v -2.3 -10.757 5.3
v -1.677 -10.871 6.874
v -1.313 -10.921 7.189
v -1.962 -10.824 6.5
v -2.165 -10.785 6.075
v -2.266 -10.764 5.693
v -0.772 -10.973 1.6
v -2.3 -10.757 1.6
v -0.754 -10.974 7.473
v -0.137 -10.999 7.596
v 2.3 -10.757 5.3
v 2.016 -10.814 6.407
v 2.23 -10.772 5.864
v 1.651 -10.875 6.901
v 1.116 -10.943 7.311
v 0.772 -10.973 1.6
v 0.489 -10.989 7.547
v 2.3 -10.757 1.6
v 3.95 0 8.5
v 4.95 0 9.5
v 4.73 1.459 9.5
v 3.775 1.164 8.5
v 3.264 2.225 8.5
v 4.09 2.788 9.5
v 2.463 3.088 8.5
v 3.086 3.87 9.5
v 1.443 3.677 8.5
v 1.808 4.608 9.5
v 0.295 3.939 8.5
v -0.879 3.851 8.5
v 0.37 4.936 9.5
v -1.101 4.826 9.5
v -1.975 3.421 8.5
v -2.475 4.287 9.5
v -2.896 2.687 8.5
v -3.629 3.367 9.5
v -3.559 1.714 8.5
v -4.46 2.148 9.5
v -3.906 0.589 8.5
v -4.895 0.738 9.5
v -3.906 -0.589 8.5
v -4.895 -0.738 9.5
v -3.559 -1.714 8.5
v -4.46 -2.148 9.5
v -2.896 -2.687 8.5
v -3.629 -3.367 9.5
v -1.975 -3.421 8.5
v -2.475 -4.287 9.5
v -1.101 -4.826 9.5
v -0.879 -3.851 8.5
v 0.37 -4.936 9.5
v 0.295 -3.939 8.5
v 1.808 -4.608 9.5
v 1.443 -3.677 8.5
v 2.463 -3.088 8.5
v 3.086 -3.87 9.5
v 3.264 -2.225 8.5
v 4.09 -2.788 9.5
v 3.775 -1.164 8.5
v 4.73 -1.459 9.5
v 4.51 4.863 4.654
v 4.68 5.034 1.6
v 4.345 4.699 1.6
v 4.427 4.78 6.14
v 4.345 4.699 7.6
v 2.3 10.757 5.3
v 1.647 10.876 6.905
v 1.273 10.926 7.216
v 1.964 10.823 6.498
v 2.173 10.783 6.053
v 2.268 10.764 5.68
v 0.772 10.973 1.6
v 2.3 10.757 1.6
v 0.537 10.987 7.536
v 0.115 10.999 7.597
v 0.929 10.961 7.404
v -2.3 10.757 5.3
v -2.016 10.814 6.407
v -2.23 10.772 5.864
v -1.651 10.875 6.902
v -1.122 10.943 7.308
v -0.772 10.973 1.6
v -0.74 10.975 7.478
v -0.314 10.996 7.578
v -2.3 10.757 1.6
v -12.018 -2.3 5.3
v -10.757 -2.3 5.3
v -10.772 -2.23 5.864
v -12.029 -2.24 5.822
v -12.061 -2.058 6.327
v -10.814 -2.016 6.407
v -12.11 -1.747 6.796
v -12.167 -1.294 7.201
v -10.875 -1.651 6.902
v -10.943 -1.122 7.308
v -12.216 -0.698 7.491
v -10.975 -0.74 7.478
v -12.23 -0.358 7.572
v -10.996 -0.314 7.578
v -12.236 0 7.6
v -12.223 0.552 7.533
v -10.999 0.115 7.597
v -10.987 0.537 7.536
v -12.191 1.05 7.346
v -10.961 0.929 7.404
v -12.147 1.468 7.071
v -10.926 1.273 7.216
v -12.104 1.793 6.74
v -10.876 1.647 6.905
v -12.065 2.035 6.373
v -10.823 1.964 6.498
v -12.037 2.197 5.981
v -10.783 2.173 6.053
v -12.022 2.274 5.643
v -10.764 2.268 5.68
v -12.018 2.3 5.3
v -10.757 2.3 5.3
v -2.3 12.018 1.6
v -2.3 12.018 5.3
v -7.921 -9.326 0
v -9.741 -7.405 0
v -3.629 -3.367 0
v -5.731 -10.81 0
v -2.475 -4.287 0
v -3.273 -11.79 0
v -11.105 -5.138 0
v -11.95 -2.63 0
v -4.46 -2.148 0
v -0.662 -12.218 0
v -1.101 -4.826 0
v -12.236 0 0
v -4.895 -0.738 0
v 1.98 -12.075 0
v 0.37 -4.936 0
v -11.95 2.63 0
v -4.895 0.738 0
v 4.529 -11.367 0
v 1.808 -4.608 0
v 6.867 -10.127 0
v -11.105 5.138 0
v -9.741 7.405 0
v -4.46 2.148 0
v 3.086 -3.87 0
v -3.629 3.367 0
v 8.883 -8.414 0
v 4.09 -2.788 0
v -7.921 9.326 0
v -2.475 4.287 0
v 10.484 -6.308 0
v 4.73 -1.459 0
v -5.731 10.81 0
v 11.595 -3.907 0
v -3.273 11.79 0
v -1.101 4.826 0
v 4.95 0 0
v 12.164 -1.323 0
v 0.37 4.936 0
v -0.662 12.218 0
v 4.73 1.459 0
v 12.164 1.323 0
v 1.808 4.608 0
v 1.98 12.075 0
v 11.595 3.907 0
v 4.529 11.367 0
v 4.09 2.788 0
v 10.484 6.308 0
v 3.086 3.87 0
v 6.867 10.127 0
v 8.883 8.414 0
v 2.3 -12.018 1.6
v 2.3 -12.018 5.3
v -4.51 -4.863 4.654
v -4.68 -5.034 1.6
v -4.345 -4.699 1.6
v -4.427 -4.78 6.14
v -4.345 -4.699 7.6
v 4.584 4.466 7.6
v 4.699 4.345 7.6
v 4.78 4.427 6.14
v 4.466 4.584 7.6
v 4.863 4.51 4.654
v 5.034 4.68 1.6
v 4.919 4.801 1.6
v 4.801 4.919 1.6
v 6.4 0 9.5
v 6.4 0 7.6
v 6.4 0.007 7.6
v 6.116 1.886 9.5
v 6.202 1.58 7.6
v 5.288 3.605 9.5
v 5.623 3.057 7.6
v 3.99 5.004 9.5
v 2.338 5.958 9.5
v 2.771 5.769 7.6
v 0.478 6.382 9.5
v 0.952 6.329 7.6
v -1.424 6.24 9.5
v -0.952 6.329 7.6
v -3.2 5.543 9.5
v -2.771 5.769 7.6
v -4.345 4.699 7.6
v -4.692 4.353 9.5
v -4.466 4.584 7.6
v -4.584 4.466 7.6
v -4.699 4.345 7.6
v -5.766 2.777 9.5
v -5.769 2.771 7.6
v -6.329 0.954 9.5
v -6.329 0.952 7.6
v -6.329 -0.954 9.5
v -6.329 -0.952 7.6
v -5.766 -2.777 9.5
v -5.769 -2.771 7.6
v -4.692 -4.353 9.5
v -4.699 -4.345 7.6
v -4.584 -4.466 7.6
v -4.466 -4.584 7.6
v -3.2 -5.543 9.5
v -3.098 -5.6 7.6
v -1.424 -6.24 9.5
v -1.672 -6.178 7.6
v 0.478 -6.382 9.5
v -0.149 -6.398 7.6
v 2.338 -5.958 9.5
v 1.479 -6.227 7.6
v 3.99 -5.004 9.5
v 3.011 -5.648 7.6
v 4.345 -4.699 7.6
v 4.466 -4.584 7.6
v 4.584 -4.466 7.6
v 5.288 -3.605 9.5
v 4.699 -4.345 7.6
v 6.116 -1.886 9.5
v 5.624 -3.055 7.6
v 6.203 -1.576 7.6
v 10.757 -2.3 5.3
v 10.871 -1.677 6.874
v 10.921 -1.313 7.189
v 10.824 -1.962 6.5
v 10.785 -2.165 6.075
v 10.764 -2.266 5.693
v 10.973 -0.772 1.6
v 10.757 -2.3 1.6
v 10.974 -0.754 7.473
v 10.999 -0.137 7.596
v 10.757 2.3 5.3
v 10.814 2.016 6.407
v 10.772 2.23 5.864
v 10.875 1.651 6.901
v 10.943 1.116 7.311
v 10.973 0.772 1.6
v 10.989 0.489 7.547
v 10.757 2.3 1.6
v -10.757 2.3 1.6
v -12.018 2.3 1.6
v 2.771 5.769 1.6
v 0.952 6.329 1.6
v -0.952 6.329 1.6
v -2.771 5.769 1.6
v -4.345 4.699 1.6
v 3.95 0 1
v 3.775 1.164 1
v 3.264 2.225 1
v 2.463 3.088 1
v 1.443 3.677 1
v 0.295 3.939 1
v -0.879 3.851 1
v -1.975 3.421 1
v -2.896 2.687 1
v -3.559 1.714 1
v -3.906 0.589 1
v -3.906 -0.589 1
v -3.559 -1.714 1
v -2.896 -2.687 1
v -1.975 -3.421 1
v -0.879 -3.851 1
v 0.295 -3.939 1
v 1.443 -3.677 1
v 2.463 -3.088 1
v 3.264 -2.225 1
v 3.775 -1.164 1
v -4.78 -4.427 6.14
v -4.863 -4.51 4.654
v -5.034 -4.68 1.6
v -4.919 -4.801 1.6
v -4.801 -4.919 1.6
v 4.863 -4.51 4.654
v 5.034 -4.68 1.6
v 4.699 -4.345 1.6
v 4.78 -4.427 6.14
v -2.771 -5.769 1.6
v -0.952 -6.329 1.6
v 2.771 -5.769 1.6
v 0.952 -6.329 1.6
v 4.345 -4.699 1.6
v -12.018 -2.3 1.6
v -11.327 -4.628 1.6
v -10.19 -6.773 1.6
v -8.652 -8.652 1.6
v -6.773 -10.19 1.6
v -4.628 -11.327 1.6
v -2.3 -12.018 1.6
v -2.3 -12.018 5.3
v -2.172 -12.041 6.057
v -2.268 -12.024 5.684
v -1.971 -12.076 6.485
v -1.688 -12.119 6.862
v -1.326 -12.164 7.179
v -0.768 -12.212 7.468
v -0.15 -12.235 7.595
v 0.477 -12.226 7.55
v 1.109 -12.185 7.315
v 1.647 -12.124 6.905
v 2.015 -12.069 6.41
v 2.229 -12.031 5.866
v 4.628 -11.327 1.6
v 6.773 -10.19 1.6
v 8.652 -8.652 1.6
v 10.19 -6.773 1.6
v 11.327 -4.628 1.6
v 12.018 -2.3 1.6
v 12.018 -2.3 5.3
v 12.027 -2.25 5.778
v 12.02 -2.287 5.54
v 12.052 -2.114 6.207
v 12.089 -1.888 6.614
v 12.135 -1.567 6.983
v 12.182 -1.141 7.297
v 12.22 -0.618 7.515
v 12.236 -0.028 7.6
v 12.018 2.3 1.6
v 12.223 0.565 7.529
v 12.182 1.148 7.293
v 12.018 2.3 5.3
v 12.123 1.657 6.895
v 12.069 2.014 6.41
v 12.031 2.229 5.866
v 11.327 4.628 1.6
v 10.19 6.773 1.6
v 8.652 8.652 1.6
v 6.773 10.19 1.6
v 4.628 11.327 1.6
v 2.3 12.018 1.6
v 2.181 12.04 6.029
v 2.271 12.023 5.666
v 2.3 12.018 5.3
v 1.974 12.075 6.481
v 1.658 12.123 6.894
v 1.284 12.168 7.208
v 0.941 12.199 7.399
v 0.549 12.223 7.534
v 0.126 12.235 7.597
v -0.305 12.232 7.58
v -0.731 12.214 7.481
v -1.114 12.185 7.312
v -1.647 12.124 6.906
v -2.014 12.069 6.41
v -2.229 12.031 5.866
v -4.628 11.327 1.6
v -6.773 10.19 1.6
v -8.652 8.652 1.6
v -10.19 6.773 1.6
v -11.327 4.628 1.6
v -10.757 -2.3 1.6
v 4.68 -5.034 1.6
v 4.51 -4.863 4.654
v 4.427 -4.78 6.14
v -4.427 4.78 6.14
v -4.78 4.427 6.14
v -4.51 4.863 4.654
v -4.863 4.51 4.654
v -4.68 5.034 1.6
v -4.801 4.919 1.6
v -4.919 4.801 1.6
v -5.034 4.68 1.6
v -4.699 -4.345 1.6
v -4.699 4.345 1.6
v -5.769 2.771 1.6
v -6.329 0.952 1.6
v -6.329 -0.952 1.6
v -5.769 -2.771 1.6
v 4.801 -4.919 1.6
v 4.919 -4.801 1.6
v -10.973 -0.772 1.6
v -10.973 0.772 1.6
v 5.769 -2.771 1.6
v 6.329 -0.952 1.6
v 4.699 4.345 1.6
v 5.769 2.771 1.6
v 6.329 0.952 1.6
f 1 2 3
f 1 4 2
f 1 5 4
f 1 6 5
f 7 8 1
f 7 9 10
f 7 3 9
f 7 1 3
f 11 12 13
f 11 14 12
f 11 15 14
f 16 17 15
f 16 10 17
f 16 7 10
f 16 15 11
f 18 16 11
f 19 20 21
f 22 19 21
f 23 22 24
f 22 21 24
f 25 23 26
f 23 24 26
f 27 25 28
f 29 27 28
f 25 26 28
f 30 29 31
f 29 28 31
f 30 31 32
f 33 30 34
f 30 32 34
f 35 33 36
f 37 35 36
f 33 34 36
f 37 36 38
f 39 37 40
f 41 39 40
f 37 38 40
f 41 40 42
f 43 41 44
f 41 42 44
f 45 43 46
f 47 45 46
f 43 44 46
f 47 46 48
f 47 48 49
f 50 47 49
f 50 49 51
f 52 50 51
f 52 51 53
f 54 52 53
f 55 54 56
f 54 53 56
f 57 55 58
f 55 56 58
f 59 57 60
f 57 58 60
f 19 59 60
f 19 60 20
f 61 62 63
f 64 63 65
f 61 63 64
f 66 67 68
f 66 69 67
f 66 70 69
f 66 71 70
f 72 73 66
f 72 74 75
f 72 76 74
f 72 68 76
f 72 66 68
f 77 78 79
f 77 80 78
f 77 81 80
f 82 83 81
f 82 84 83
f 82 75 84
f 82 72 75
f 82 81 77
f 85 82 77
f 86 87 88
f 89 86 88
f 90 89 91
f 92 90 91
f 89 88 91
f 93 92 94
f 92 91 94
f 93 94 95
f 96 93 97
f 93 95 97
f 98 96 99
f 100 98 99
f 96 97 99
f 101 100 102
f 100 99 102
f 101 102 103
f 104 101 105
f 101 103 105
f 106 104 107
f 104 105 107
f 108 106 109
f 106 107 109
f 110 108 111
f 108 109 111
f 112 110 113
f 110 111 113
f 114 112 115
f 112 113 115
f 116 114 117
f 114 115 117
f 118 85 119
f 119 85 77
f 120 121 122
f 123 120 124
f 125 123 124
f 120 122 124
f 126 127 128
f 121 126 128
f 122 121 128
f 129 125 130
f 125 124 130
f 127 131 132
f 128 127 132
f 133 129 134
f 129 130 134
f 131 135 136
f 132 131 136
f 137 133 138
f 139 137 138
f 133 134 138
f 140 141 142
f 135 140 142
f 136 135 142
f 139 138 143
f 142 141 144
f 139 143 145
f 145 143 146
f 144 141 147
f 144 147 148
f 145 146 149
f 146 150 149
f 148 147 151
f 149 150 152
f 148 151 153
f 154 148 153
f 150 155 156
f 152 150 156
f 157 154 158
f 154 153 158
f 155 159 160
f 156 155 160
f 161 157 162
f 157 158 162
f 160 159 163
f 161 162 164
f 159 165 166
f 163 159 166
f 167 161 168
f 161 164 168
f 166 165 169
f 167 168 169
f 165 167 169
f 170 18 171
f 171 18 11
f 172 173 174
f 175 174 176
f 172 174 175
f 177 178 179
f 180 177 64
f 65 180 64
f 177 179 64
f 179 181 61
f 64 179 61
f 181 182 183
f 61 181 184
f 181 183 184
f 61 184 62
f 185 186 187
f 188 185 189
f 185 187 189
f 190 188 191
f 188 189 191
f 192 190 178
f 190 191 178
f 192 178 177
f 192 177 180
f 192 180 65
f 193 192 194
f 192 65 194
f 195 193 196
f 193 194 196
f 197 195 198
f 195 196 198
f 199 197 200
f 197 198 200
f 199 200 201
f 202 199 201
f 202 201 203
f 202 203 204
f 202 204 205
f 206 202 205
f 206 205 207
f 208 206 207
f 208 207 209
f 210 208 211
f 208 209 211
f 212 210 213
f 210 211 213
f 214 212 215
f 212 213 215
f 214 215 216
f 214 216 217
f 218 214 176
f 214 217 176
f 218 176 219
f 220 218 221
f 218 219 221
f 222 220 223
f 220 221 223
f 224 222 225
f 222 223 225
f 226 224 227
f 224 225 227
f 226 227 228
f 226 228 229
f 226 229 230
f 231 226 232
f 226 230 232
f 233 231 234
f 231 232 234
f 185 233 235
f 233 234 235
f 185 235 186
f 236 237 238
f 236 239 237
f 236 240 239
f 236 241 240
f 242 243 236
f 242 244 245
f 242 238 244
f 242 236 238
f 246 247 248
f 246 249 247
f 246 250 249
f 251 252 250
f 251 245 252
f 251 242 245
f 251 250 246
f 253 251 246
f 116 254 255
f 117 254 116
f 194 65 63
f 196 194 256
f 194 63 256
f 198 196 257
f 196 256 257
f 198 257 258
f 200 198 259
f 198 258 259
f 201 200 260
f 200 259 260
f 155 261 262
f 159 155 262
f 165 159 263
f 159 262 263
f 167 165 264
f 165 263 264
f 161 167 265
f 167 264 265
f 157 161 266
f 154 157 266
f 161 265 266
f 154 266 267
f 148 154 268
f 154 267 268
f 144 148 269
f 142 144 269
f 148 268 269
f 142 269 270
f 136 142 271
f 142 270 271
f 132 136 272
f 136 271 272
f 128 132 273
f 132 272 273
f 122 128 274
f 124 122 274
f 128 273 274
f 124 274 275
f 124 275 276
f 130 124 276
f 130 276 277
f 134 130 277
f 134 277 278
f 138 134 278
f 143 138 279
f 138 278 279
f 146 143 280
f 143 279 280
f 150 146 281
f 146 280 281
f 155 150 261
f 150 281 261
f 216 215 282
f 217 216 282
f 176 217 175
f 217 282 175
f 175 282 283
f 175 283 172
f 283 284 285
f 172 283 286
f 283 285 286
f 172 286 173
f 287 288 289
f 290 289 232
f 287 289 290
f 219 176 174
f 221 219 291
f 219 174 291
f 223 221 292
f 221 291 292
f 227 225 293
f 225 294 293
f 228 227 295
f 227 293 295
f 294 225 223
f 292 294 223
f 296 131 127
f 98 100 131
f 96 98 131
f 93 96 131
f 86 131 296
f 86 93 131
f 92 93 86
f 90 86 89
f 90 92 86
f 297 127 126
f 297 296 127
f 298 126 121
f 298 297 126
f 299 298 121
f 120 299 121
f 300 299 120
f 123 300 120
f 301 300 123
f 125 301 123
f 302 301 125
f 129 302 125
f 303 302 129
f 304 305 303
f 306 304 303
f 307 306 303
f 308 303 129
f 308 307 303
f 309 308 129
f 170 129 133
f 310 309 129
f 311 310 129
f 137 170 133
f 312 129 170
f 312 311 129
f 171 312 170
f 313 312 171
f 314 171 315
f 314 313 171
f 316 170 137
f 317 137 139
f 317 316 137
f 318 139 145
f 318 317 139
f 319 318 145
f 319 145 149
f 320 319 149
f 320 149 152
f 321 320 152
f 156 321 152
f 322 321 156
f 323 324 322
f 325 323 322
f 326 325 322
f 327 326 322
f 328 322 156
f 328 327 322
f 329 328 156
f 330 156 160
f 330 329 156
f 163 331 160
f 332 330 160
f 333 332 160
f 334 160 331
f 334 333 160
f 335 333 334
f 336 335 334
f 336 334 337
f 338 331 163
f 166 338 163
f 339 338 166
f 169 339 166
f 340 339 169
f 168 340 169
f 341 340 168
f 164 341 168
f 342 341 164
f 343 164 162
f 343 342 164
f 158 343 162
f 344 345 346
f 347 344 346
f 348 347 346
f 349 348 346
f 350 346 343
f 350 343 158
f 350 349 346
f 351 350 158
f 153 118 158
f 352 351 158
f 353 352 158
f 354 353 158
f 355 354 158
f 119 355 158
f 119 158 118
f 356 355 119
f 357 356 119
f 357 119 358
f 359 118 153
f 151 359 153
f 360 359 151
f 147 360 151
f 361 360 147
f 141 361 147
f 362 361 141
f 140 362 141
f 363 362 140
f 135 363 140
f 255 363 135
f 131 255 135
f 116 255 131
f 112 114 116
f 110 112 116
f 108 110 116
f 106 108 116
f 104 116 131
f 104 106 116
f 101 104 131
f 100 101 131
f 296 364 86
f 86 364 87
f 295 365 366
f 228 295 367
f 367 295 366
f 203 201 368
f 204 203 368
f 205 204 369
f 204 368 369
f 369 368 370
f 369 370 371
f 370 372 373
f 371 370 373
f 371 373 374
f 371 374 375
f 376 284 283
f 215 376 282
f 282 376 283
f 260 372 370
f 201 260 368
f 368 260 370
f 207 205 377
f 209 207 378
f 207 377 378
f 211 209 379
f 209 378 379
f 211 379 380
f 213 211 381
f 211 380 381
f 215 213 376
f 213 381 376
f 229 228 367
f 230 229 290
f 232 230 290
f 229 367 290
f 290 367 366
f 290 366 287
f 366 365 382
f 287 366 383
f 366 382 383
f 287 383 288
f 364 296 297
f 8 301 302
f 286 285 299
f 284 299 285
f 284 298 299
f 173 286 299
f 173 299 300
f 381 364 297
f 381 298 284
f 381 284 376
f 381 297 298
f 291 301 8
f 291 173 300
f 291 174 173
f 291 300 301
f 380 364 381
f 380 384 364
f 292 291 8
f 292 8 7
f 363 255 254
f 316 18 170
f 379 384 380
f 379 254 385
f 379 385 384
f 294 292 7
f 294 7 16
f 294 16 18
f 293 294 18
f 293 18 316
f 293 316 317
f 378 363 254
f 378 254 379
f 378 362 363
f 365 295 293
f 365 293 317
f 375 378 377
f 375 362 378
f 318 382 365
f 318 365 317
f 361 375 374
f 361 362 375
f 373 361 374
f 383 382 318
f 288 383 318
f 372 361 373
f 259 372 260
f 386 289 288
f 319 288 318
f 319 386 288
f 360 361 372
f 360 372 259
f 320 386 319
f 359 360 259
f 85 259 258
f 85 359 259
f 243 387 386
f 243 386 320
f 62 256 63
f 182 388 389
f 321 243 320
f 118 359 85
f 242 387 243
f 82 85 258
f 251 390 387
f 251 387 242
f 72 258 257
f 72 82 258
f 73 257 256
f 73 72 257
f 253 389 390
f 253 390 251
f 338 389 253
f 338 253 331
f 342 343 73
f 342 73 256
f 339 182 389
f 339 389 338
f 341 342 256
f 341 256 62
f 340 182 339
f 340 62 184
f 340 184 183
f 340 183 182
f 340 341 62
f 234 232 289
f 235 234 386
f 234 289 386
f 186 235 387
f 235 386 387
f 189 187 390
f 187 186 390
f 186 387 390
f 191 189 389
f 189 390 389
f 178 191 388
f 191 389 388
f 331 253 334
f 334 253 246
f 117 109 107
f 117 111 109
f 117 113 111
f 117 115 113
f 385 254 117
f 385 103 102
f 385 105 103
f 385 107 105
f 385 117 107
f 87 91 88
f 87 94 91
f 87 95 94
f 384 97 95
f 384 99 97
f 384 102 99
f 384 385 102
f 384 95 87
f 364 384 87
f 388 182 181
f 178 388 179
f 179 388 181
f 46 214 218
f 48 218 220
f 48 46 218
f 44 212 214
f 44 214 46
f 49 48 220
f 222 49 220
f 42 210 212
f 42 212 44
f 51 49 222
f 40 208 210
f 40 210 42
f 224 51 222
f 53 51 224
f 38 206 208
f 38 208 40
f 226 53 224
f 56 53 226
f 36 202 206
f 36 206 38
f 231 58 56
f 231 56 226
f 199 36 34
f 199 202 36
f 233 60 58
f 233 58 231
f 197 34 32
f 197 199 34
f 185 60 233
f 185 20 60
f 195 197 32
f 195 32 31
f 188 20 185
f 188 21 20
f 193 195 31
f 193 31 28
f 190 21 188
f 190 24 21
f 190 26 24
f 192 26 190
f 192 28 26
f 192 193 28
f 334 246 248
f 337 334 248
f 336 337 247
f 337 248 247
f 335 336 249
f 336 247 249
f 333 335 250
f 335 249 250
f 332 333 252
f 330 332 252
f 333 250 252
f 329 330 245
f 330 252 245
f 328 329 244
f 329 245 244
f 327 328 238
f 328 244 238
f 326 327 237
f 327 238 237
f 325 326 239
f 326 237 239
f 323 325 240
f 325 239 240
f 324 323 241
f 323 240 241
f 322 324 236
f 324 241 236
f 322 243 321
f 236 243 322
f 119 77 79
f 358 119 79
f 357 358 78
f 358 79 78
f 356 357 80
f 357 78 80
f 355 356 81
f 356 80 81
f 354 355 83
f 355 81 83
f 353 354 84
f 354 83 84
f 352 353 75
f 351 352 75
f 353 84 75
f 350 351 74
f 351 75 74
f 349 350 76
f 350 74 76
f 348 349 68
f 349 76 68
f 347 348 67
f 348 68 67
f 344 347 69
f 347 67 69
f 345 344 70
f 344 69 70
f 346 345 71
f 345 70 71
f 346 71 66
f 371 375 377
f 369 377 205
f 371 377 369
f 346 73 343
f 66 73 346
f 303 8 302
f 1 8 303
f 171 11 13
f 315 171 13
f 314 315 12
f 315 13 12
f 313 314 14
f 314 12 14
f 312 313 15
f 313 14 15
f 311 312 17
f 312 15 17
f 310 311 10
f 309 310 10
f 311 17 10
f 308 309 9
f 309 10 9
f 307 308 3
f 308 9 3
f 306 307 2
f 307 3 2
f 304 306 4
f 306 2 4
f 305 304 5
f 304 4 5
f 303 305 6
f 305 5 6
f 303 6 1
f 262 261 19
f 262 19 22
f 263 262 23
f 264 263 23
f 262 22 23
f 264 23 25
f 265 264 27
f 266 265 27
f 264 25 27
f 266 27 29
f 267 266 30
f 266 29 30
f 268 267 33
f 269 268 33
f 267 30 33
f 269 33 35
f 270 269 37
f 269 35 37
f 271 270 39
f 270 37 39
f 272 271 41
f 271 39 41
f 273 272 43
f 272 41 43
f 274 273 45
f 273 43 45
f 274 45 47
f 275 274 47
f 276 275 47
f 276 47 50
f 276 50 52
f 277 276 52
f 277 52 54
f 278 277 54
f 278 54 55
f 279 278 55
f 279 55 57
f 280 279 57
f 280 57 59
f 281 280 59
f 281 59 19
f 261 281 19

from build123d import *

# Parameters (mm, degrees)
SKETCH_R           = 12.45
PAD_DEPTH          = 1.6
SKETCH001_R        = 6.4
PAD001_DEPTH       = 7.9
PAD002_DEPTH       = 14
POLARPATTERN_COUNT = 4
POCKET_DEPTH       = 10
SKETCH004_W        = 4
SKETCH004_H        = 10
SKETCH005_R        = 3.95
POCKET001_DEPTH    = 9.501
CHAMFER_SIZE       = 1


with BuildPart() as part:
    # Sketch → Pad (new body)
    with BuildSketch(Plane.XY):
        Circle(SKETCH_R)
    extrude(amount=PAD_DEPTH)

    # Sketch001 (on Face3 of Pad) → Pad001 (join)
    with BuildSketch(Plane.XY.offset(1.6)):
        Circle(SKETCH001_R)
    extrude(amount=PAD001_DEPTH)

    # Sketch002 → Pad002 (join)
    with BuildSketch(Plane.XZ):
        with BuildLine():
            Line((-2.3, 0), (-2.3, 5.3))
            ThreePointArc((2.3, 5.3), (0, 7.6), (-2.3, 5.3))
            Line((2.3, 0), (2.3, 5.3))
            Line((-2.3, 0), (2.3, 0))
        make_face()
    pad002 = extrude(amount=PAD002_DEPTH)

    # PolarPattern: Pad002 ×4 about axis
    polarpattern_axis = Axis((0, 0, 0), (0, 0, 1))
    for i in range(1, POLARPATTERN_COUNT):
        add(pad002.rotate(polarpattern_axis, i * 360 / POLARPATTERN_COUNT))

    # Sketch006 → Revolution (revolve)
    with BuildSketch(Plane.XZ):
        Polygon((0, 0), (0, 7.6), (6.4, 7.6), (7, 0), align=None)
    revolve(axis=Axis((0, 0, 0), (0, 0, 1)))

    # Sketch007 (on Face28 of Revolution) → Pocket (cut)
    with BuildSketch(Plane.XY.offset(1.6)):
        with BuildLine():
            ThreePointArc((-7.952942, 7.599389), (-11, 0), (-7.952942, -7.599389))
            Line((-7.952942, -7.599389), (-4.698806, -4.345253))
            ThreePointArc((-4.698806, 4.345253), (-6.4, 0), (-4.698806, -4.345253))
            Line((-7.952942, 7.599389), (-4.698806, 4.345253))
        make_face()
        with BuildLine():
            ThreePointArc((-7.599389, -7.952942), (0, -11), (7.599389, -7.952942))
            Line((7.599389, -7.952942), (4.345253, -4.698806))
            ThreePointArc((-4.345253, -4.698806), (0, -6.4), (4.345253, -4.698806))
            Line((-7.599389, -7.952942), (-4.345253, -4.698806))
        make_face()
        with BuildLine():
            ThreePointArc((7.952942, -7.599389), (11, 0), (7.952942, 7.599389))
            Line((7.952942, 7.599389), (4.698806, 4.345253))
            ThreePointArc((4.698806, -4.345253), (6.4, 0), (4.698806, 4.345253))
            Line((7.952942, -7.599389), (4.698806, -4.345253))
        make_face()
        with BuildLine():
            ThreePointArc((7.599389, 7.952942), (0, 11), (-7.599389, 7.952942))
            Line((-7.599389, 7.952942), (-4.345253, 4.698806))
            ThreePointArc((4.345253, 4.698806), (0, 6.4), (-4.345253, 4.698806))
            Line((7.599389, 7.952942), (4.345253, 4.698806))
        make_face()
    extrude(amount=POCKET_DEPTH, mode=Mode.SUBTRACT)

    # Sketch004 → Groove (revolve, cut)
    with BuildSketch(Plane.XZ):
        with Locations((-14.235706, 5)):
            Rectangle(SKETCH004_W, SKETCH004_H)
    revolve(axis=Axis((0, 0, 0), (0, 0, 1)), mode=Mode.SUBTRACT)

    # Sketch005 (on Face73 of Groove) → Pocket001 (cut, through all)
    with BuildSketch(Plane.XY.offset(9.5)):
        Circle(SKETCH005_R)
    extrude(amount=-POCKET001_DEPTH, mode=Mode.SUBTRACT)

    # Chamfer
    chamfer_edges = [part.edges().sort_by_distance(p)[0] for p in [
        (-3.95, 0, 9.5),
        (0, -3.95, 0),
    ]]
    chamfer(chamfer_edges, length=CHAMFER_SIZE)


solid = part.part
